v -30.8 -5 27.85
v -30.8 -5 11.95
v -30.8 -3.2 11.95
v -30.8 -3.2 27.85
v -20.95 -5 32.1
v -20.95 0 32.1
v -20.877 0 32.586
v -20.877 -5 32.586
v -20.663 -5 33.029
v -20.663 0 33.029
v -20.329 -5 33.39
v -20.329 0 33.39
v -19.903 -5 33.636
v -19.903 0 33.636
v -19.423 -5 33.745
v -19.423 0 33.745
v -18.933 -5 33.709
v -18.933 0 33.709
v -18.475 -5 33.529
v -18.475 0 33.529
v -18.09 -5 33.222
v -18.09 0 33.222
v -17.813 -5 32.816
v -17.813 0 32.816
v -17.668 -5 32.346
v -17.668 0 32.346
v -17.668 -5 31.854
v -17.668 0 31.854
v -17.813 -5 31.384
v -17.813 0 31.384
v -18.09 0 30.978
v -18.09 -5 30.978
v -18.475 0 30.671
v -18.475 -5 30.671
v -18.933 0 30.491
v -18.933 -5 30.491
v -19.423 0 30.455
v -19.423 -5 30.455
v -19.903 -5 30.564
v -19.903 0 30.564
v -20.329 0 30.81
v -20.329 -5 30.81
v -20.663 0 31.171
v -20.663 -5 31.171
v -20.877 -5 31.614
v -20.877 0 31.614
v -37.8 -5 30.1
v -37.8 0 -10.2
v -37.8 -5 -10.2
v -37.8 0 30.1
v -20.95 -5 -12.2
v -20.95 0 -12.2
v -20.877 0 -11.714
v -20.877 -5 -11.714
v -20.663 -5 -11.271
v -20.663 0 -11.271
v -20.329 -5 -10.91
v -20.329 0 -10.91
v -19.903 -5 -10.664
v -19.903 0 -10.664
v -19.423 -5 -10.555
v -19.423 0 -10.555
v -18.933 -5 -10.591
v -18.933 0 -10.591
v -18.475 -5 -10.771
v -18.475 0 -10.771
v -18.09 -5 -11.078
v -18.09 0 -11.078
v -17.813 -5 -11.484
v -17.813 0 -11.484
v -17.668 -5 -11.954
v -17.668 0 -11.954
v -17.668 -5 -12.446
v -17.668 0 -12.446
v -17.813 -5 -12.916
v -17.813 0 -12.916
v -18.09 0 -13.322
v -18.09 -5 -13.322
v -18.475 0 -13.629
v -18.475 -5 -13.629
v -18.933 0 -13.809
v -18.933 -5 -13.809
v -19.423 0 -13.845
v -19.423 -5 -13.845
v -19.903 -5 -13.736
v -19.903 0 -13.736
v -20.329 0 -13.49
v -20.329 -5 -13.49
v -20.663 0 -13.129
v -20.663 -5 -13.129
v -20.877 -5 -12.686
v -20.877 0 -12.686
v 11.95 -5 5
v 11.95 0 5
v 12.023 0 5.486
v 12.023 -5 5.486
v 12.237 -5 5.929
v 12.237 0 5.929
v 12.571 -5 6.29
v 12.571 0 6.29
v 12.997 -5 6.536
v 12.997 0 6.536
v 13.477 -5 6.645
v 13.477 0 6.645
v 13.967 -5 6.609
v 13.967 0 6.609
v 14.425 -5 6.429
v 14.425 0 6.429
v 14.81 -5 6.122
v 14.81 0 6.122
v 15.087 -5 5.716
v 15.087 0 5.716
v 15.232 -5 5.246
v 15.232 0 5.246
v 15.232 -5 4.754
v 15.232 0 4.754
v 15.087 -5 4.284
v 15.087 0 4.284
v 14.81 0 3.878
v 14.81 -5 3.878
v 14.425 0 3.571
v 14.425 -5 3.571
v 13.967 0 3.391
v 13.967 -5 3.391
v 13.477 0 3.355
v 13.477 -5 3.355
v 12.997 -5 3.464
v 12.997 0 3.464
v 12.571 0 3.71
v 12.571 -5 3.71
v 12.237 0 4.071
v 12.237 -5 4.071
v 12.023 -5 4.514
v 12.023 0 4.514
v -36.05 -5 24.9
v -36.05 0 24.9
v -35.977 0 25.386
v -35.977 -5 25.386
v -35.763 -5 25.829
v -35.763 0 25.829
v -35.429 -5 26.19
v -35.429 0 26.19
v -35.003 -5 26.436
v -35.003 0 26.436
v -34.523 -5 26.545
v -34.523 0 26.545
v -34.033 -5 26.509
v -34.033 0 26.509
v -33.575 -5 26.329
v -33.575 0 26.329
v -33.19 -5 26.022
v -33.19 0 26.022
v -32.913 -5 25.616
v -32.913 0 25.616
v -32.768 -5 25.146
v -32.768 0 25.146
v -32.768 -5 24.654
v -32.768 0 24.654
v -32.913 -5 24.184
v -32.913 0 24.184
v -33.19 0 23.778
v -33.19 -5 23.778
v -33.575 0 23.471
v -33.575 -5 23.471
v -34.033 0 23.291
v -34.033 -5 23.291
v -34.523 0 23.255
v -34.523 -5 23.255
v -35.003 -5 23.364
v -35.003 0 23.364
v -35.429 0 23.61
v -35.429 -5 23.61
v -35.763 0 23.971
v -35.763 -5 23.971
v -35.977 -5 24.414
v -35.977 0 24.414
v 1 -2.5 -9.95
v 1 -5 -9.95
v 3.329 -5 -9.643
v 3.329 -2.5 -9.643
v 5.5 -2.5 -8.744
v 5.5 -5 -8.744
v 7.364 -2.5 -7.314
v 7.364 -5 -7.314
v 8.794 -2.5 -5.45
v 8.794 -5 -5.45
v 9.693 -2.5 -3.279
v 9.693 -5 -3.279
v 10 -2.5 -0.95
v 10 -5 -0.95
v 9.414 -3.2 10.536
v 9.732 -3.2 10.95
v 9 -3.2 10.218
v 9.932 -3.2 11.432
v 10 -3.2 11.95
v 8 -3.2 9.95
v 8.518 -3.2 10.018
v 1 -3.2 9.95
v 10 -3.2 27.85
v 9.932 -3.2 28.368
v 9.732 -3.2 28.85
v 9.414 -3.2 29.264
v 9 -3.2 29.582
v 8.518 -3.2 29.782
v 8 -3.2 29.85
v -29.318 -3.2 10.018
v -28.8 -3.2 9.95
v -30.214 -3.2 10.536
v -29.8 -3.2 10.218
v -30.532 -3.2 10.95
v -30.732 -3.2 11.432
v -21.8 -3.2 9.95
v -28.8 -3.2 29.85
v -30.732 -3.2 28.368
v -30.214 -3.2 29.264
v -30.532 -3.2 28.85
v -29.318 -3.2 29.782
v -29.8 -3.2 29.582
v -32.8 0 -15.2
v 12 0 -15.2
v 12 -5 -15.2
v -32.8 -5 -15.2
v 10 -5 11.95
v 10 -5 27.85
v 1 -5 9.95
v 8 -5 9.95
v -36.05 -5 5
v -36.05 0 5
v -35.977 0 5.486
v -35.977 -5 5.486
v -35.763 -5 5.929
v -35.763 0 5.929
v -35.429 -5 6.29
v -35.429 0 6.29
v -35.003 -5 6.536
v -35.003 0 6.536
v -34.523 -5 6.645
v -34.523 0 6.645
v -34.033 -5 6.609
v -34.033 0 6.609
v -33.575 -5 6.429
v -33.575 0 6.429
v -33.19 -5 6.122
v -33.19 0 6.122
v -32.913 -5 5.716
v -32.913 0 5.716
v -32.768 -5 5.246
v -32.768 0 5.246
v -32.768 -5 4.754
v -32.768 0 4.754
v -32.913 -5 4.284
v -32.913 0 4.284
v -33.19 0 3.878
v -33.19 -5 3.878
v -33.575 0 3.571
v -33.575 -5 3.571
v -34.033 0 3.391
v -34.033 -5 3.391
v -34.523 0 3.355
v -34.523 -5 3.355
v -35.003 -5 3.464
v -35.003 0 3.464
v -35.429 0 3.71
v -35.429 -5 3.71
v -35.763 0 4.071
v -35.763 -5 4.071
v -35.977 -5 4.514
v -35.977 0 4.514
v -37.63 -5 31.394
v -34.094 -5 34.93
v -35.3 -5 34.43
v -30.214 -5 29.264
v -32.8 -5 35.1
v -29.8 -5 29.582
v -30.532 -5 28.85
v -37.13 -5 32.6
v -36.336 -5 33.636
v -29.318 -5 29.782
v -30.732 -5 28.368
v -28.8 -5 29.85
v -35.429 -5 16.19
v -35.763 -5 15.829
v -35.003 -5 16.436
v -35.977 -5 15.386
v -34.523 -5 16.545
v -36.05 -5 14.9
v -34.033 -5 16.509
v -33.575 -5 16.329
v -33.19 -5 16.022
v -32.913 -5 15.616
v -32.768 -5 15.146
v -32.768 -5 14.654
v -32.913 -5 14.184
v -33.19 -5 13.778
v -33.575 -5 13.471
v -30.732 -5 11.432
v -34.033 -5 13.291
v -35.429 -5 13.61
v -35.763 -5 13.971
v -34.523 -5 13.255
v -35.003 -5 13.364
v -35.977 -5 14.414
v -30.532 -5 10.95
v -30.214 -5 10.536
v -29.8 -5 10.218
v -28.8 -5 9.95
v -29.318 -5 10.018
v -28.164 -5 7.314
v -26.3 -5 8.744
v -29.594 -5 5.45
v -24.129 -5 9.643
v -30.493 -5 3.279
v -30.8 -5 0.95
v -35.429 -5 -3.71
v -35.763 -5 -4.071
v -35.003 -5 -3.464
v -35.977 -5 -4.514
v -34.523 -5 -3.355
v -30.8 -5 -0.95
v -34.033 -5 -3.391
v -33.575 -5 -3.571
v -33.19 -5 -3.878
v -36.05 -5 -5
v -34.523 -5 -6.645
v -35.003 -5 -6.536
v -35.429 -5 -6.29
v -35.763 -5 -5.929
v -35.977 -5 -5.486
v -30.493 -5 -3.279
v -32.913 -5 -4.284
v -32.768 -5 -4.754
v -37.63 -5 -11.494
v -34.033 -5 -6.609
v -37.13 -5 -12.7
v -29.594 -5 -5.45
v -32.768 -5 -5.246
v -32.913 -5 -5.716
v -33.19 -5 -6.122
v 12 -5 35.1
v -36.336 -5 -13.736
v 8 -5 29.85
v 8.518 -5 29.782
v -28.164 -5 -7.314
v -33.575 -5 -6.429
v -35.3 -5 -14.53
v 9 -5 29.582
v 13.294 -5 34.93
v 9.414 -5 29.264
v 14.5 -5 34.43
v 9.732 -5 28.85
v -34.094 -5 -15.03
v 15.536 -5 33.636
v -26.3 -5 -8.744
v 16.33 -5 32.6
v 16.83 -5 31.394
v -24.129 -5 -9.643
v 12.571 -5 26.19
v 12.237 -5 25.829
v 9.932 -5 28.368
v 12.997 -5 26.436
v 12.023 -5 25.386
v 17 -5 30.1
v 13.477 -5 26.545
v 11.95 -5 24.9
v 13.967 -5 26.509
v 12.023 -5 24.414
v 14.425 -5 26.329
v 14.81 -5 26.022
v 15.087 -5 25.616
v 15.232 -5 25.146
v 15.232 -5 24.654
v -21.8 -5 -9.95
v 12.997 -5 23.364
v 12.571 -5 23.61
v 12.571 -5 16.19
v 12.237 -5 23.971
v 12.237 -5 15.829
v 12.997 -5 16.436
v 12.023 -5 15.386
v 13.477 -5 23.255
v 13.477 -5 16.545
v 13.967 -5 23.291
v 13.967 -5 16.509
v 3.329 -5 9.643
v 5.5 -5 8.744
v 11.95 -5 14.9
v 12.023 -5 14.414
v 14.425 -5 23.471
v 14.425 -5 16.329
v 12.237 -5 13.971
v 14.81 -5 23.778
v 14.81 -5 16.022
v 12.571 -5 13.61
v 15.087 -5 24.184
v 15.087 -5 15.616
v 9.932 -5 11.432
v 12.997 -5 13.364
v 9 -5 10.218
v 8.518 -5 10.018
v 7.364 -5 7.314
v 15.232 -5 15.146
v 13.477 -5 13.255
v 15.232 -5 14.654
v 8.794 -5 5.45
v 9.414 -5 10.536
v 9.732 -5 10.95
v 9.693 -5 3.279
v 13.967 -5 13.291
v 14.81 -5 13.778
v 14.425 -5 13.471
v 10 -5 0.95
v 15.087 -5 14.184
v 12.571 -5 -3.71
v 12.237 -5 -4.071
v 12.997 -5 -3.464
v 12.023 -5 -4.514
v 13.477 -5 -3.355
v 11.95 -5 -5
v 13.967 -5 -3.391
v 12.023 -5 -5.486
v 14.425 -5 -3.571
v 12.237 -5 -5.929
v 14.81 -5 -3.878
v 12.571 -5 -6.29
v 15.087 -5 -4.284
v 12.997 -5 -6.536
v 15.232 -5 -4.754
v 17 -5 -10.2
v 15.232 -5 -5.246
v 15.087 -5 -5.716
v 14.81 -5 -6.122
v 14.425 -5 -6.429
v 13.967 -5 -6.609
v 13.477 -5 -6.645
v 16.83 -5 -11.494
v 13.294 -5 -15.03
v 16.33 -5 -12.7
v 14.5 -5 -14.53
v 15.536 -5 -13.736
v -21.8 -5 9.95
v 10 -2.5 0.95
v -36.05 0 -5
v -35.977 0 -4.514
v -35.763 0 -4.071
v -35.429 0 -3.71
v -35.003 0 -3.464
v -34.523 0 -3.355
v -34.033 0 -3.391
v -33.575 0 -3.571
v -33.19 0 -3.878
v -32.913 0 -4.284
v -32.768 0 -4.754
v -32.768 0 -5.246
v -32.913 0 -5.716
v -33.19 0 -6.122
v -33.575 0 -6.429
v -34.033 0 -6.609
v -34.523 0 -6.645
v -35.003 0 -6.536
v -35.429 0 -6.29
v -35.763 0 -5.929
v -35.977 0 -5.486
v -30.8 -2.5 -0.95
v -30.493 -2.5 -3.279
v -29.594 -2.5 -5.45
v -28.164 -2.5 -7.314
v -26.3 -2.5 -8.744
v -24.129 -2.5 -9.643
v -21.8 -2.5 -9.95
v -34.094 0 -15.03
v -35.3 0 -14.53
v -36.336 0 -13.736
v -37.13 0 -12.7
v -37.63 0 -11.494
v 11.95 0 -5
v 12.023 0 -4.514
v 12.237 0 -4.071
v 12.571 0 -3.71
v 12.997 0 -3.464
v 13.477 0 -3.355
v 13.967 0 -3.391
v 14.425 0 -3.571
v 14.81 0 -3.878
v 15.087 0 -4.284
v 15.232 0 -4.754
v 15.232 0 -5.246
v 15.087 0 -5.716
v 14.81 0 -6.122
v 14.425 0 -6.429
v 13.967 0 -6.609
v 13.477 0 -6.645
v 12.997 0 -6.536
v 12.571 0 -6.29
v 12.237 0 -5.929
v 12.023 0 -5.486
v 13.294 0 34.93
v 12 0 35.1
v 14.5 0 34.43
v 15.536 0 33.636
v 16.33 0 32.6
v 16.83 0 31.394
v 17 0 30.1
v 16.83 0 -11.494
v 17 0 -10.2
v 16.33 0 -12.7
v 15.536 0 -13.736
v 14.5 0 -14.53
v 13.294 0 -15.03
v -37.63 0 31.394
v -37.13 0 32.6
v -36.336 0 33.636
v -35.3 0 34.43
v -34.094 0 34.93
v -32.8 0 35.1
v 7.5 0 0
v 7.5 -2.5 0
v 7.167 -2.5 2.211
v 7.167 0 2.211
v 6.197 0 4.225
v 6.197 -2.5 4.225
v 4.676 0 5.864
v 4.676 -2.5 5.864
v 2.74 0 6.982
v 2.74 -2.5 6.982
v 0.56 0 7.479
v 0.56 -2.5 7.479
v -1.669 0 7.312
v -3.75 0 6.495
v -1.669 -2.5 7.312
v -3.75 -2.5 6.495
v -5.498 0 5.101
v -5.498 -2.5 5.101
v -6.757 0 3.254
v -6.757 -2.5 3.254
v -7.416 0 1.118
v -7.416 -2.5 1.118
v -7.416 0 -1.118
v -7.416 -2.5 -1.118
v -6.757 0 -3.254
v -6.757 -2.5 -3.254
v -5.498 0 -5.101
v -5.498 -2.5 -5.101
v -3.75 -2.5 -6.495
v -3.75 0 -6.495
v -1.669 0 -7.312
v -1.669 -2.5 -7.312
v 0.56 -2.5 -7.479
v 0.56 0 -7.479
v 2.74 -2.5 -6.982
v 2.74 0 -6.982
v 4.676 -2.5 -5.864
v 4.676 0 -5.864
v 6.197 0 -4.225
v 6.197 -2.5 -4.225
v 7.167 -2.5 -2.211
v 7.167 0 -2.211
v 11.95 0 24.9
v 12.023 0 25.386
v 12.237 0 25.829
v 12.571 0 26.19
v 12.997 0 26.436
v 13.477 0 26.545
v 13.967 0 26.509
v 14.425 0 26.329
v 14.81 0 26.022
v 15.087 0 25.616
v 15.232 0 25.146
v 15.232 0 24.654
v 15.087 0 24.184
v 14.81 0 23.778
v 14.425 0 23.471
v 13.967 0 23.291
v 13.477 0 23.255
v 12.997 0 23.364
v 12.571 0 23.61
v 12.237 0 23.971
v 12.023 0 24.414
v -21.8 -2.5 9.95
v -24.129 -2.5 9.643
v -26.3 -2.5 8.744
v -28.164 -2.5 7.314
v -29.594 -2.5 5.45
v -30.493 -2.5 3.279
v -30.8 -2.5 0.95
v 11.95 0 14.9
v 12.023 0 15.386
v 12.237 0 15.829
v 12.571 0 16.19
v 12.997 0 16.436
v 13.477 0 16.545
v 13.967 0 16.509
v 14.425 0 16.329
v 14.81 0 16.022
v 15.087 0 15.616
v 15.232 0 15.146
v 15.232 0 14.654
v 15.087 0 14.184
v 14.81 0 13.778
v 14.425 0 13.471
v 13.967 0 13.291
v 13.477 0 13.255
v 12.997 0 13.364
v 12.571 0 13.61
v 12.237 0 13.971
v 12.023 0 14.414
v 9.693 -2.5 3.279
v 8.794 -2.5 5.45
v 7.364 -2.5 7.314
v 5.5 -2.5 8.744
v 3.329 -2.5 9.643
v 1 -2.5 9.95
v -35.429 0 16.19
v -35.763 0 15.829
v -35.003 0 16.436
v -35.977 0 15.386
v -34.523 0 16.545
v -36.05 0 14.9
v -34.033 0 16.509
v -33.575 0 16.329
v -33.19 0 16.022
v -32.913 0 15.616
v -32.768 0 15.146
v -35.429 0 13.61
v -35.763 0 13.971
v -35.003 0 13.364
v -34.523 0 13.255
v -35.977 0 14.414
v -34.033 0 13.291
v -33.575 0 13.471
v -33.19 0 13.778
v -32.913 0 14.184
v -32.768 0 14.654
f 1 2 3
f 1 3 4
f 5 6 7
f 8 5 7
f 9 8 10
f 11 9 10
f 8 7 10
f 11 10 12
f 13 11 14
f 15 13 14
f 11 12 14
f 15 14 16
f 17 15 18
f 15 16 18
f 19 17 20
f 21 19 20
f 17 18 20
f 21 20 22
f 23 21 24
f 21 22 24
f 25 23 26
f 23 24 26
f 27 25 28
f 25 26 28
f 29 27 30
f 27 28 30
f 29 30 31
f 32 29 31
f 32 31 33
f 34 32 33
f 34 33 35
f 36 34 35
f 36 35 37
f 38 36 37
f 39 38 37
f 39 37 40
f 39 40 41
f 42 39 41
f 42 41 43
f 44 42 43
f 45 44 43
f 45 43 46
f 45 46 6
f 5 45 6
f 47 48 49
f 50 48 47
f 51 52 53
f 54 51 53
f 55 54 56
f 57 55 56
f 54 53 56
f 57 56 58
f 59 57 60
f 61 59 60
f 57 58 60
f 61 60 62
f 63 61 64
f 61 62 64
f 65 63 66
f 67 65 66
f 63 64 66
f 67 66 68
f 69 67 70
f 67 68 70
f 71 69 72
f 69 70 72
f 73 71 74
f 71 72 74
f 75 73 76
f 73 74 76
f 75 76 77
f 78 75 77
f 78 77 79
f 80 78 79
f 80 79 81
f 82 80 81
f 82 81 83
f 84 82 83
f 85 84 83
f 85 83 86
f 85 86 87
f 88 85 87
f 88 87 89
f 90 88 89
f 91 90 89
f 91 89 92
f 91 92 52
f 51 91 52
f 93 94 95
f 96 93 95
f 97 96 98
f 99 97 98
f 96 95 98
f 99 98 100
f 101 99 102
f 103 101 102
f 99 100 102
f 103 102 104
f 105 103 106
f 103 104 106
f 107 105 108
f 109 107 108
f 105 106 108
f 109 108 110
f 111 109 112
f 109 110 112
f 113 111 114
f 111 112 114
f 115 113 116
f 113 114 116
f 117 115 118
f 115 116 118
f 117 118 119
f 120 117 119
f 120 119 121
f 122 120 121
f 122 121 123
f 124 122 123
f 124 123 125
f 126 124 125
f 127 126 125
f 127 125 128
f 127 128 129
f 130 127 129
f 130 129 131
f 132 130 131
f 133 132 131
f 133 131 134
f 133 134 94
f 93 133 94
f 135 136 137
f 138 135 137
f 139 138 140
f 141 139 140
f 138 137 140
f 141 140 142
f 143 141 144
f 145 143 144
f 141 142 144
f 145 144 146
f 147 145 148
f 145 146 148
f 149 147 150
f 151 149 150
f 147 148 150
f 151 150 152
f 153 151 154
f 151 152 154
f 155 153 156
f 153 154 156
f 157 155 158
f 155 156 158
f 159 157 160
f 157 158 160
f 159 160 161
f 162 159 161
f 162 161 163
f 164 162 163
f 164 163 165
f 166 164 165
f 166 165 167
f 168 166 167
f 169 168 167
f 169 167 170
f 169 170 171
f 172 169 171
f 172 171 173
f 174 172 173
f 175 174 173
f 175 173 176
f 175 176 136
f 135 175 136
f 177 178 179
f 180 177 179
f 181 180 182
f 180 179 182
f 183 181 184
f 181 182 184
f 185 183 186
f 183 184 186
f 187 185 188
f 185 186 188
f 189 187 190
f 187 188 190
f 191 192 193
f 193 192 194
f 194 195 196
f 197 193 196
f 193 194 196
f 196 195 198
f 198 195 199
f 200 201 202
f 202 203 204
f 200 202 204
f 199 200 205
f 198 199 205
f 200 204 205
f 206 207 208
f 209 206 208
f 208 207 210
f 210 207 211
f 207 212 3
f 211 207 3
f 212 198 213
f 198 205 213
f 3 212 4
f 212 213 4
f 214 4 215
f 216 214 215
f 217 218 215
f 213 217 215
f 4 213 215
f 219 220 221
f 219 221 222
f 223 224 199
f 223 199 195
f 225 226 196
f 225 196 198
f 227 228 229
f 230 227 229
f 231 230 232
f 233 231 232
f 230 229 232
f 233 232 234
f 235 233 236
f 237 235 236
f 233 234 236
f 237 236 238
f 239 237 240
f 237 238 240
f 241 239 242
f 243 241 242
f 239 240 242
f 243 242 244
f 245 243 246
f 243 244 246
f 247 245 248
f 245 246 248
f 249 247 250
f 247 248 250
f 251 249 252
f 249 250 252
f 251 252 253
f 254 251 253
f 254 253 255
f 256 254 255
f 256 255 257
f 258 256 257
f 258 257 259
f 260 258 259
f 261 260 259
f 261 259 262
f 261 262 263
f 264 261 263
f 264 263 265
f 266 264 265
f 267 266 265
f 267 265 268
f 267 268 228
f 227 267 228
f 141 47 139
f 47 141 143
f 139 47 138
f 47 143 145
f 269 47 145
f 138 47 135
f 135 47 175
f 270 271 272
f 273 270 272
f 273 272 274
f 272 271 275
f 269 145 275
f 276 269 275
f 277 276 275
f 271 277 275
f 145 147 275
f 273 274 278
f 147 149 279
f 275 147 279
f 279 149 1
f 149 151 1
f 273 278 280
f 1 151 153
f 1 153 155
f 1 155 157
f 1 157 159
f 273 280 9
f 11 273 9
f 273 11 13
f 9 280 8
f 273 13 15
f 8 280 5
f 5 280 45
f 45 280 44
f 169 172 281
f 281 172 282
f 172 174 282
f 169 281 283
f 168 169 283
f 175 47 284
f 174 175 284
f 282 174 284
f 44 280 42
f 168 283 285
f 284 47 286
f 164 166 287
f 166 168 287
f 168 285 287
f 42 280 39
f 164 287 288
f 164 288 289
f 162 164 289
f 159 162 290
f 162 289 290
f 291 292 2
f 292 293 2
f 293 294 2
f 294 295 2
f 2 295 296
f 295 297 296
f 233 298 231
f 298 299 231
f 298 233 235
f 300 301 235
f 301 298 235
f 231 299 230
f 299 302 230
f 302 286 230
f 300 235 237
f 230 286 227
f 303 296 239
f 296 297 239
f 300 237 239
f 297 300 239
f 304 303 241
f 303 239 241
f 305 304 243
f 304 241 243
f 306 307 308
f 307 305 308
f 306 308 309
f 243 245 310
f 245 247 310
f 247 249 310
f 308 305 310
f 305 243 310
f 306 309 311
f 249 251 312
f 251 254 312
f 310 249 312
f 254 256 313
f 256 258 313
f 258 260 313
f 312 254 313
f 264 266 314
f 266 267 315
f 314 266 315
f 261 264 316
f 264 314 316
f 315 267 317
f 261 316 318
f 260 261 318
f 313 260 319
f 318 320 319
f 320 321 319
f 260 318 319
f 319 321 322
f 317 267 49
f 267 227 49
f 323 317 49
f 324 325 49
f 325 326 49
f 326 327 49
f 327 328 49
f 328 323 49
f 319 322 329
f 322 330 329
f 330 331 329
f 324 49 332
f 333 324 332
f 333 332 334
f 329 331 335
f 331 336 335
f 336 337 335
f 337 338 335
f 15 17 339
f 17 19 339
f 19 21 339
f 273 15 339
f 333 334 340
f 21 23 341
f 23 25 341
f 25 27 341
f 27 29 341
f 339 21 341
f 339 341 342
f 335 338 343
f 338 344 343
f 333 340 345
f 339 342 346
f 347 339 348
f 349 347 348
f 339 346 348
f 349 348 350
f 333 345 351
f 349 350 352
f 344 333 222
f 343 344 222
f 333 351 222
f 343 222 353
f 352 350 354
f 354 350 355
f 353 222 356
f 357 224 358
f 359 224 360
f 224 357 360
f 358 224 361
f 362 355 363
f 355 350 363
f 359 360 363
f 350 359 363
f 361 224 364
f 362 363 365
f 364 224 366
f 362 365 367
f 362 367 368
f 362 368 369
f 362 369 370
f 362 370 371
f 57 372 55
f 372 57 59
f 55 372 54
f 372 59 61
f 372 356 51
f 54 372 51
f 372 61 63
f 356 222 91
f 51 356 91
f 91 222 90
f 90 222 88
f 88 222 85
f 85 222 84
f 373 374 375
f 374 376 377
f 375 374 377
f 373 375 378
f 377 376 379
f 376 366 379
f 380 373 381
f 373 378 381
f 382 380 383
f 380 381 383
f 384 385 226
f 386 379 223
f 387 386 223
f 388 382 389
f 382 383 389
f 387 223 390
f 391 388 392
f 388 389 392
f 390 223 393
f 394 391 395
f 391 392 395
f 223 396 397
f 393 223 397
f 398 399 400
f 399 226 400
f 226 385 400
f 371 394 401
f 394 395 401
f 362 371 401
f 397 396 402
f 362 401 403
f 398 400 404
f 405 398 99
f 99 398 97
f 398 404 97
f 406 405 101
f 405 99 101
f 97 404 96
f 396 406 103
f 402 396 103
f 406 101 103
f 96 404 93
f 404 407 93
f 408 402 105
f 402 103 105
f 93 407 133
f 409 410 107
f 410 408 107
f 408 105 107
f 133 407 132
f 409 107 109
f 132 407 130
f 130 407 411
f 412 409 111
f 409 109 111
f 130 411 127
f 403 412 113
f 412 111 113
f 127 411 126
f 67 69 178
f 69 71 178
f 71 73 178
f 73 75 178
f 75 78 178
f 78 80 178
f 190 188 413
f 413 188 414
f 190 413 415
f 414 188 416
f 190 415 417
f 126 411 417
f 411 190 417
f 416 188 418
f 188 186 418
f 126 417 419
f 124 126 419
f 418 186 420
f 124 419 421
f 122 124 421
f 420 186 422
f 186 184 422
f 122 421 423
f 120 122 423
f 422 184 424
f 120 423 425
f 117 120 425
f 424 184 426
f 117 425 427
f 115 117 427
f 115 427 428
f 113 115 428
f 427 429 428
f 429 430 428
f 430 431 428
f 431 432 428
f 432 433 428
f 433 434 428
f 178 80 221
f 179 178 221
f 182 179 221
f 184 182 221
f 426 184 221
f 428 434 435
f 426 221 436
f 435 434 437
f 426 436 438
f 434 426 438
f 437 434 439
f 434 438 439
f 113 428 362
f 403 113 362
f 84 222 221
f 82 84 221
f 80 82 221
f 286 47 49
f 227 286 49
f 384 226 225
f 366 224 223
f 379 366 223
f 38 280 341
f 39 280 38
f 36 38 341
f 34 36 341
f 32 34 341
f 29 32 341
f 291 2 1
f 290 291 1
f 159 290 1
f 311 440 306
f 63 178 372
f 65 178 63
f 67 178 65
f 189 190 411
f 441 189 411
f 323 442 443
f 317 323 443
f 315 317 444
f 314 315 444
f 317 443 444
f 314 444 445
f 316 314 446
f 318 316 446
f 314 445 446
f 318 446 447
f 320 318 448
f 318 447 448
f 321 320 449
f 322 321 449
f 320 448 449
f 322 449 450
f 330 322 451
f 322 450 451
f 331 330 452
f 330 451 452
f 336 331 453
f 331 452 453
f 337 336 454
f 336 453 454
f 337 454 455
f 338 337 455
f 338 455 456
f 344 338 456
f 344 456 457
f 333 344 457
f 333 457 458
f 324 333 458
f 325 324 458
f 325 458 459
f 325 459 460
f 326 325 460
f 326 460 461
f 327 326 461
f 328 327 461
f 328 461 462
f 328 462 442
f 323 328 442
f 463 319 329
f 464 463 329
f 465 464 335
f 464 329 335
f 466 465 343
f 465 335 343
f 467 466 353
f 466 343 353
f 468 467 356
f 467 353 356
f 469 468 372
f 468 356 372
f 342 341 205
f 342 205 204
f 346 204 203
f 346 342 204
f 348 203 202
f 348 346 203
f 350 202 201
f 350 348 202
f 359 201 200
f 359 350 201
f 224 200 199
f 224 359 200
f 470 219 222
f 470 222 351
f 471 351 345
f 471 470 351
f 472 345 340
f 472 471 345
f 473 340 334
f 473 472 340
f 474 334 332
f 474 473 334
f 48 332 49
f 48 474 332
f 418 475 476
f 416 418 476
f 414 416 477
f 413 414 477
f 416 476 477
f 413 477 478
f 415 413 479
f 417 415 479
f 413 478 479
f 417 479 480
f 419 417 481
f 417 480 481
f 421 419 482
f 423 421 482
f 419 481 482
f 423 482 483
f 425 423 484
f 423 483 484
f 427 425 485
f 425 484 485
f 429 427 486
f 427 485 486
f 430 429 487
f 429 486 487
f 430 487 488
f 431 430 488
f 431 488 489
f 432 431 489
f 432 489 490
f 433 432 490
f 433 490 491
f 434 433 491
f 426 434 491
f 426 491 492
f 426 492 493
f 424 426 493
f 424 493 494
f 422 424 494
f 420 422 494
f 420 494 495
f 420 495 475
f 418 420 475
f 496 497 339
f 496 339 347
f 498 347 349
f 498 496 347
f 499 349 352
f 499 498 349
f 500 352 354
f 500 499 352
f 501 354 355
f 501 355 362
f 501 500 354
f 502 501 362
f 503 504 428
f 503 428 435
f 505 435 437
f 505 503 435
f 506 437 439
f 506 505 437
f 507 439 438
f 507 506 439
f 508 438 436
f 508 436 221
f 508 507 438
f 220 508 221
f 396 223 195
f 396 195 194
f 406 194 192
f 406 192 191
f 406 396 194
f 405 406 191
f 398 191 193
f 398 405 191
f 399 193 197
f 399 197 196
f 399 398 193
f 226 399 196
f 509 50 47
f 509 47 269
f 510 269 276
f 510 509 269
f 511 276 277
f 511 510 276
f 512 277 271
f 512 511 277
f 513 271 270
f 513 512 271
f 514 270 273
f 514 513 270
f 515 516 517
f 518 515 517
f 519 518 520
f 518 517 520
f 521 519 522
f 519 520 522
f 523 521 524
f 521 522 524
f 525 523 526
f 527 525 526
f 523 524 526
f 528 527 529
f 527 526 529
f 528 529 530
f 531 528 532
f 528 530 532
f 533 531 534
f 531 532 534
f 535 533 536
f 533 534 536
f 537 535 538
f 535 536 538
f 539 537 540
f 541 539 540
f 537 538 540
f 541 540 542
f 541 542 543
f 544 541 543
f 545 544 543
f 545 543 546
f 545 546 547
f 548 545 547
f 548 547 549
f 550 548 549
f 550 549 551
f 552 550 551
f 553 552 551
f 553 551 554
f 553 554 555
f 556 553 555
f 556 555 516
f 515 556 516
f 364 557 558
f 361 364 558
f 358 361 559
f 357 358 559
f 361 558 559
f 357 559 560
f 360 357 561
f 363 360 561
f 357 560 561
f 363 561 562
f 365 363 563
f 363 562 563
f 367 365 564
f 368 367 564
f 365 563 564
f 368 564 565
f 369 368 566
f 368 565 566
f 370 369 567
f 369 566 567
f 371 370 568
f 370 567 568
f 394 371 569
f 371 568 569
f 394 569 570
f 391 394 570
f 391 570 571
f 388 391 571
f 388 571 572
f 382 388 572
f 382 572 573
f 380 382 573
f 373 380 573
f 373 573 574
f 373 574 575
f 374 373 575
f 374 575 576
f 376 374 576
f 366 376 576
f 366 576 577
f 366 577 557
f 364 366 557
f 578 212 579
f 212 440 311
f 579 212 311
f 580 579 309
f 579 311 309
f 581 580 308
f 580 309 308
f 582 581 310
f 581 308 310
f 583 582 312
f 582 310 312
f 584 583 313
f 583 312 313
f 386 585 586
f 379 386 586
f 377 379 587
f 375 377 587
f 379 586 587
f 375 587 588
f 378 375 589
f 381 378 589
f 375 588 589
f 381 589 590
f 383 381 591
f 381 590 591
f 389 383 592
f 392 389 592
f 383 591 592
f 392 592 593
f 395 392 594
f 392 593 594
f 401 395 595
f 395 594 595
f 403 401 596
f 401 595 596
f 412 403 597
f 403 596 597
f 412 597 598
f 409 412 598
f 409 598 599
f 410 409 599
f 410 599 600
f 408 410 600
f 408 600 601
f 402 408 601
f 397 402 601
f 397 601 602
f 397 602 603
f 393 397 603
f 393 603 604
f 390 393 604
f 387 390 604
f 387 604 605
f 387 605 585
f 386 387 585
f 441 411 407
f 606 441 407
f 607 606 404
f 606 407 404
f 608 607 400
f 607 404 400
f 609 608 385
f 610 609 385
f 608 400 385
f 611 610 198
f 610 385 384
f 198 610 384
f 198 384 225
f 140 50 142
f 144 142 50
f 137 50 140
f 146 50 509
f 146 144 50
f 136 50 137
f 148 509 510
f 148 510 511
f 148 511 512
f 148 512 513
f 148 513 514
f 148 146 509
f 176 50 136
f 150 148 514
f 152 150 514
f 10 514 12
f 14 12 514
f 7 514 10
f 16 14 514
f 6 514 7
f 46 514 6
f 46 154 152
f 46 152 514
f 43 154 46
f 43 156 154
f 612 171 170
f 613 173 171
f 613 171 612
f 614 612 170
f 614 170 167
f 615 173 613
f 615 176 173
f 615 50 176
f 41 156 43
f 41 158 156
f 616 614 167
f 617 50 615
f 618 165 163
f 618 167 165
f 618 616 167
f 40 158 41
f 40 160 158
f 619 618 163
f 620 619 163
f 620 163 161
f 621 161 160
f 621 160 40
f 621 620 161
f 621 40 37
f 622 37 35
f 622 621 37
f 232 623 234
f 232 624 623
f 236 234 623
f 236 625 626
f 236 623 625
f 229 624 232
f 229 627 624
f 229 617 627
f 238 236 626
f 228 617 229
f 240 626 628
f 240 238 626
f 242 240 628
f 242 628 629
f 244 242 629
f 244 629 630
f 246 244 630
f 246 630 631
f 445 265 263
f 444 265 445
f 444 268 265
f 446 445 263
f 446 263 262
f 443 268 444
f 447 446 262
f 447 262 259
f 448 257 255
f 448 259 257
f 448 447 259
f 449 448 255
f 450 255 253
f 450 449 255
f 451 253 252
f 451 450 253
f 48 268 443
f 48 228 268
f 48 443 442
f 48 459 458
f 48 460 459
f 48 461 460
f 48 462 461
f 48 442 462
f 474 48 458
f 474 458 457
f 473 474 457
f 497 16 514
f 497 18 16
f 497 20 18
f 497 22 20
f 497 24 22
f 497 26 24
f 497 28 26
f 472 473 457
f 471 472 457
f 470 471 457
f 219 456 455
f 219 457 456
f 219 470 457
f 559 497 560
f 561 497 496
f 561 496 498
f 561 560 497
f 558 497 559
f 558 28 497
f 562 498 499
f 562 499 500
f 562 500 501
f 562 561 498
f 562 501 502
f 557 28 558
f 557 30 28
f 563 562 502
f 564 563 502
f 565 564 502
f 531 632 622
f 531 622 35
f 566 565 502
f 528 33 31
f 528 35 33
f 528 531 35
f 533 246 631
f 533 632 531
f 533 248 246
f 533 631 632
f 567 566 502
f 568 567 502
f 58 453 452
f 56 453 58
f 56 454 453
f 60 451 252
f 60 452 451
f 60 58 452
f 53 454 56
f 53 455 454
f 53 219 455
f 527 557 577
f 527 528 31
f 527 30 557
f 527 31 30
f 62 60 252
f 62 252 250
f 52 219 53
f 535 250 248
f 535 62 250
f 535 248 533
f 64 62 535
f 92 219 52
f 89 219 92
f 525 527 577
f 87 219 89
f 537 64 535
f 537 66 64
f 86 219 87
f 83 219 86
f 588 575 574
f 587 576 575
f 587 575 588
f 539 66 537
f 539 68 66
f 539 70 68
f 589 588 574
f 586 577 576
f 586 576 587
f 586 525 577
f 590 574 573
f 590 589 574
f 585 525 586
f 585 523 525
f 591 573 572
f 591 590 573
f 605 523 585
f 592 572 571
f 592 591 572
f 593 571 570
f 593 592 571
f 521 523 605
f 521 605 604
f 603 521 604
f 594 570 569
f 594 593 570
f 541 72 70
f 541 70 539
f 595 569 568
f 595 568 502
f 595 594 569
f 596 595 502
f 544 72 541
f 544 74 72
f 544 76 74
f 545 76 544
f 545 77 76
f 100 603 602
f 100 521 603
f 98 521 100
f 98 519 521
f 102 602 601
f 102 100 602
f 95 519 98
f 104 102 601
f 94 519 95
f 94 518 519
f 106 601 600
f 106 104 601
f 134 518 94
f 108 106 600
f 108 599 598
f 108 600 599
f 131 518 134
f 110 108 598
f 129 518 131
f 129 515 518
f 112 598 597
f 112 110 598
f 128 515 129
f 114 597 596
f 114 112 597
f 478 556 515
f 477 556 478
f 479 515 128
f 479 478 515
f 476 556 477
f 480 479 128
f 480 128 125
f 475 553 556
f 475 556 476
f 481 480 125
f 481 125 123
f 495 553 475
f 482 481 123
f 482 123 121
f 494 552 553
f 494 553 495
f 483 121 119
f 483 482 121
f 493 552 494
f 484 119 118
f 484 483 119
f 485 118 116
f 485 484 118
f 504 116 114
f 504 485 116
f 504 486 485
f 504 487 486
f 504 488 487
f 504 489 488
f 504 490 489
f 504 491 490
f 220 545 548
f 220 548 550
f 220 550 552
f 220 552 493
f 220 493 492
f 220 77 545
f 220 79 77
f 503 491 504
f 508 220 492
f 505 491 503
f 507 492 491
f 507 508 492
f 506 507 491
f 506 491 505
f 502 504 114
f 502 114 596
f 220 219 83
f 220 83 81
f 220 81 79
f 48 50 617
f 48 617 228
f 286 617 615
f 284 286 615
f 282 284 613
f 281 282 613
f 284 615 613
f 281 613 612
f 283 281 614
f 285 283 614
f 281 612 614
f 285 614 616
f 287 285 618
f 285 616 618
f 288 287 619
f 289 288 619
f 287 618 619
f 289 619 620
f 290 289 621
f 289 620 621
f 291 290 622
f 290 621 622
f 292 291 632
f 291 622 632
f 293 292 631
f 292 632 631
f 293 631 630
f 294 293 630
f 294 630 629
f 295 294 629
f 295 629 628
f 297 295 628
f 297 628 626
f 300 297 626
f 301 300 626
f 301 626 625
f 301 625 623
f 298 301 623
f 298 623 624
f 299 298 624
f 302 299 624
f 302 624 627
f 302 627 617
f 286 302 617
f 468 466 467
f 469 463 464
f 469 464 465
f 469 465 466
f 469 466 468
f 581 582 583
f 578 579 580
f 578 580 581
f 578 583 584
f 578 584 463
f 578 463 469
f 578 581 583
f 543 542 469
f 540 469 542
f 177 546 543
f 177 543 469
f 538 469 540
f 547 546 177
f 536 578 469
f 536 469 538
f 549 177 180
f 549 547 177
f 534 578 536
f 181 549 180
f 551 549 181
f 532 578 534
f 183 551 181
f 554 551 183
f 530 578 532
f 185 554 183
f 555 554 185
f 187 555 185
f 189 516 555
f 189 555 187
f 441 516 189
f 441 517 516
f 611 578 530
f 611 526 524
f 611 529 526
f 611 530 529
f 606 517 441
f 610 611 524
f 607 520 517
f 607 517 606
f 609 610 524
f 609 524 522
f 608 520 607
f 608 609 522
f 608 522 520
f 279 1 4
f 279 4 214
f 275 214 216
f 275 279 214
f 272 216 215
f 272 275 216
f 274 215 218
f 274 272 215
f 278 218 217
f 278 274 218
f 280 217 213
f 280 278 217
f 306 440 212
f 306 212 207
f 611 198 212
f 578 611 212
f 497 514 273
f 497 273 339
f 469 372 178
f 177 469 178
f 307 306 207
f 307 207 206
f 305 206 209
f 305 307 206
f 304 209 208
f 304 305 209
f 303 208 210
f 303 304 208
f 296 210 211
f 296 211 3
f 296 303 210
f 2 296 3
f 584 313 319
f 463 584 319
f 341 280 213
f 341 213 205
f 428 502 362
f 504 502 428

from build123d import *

# Parameters (mm, degrees)
EXTRUSION1_DEPTH        = 5
ENL_V_MAT_EXTRU_2_DEPTH = 2.5
ENL_V_MAT_EXTRU_4_DEPTH = 1.8
ESQUISSE7_R             = 7.5
ENL_V_MAT_EXTRU_3_DEPTH = 52.643973511
TROU_TARAUD_M4X0_71_D   = 3.3


with BuildPart() as part:
    # Esquisse1 → Extrusion1 (new body)
    with BuildSketch(Plane(origin=(0, 0, 0), x_dir=(1, 0, 0), z_dir=(0, 1, 0))):
        with BuildLine():
            Line((-32.8, -35.1), (12, -35.1))
            ThreePointArc((12, -35.1), (15.535533906, -33.635533906), (17, -30.1))
            Line((17, -30.1), (17, 10.2))
            ThreePointArc((17, 10.2), (15.535533906, 13.735533906), (12, 15.2))
            Line((12, 15.2), (-32.8, 15.2))
            ThreePointArc((-32.8, 15.2), (-36.335533906, 13.735533906), (-37.8, 10.2))
            Line((-37.8, 10.2), (-37.8, -30.1))
            ThreePointArc((-37.8, -30.1), (-36.335533906, -33.635533906), (-32.8, -35.1))
        make_face()
    extrude(amount=-EXTRUSION1_DEPTH)

    # Esquisse6 → Enlèv. mat.-Extru.2 (cut)
    with BuildSketch(Plane.XZ.offset(5)):
        with BuildLine():
            Line((1, 9.95), (-21.8, 9.95))
            ThreePointArc((-21.8, 9.95), (-28.163961031, 7.313961031), (-30.8, 0.95))
            Line((-30.8, 0.95), (-30.8, -0.95))
            ThreePointArc((-30.8, -0.95), (-28.163961031, -7.313961031), (-21.8, -9.95))
            Line((-21.8, -9.95), (1, -9.95))
            ThreePointArc((1, -9.95), (7.363961031, -7.313961031), (10, -0.95))
            Line((10, -0.95), (10, 0.95))
            ThreePointArc((10, 0.95), (7.363961031, 7.313961031), (1, 9.95))
        make_face()
    extrude(amount=-ENL_V_MAT_EXTRU_2_DEPTH, mode=Mode.SUBTRACT)

    # Esquisse10 → Enlèv. mat.-Extru.4 (cut)
    with BuildSketch(Plane.XZ.offset(5)):
        with BuildLine():
            Line((8, 9.95), (-28.8, 9.95))
            ThreePointArc((-28.8, 9.95), (-30.214213562, 10.535786438), (-30.8, 11.95))
            Line((-30.8, 11.95), (-30.8, 27.85))
            ThreePointArc((-30.8, 27.85), (-30.214213562, 29.264213562), (-28.8, 29.85))
            Line((-28.8, 29.85), (8, 29.85))
            ThreePointArc((8, 29.85), (9.414213562, 29.264213562), (10, 27.85))
            Line((10, 27.85), (10, 11.95))
            ThreePointArc((10, 11.95), (9.414213562, 10.535786438), (8, 9.95))
        make_face()
    extrude(amount=-ENL_V_MAT_EXTRU_4_DEPTH, mode=Mode.SUBTRACT)

    # Esquisse7 → Enlèv. mat.-Extru.3 (cut, through all)
    with BuildSketch(Plane.XZ.offset(2.5)):
        Circle(ESQUISSE7_R)
    extrude(amount=-ENL_V_MAT_EXTRU_3_DEPTH, mode=Mode.SUBTRACT)

    # Trou taraudé M4x0.71 (through all)
    with Locations(Plane.XZ.offset(5)):
        with Locations((-34.4, 5), (-34.4, -5), (13.6, 5), (13.6, -5), (-19.3, -12.2), (-19.3, 32.1), (13.6, 24.9), (13.6, 14.9), (-34.4, 14.9), (-34.4, 24.9)):
            Hole(TROU_TARAUD_M4X0_71_D / 2)


solid = part.part
